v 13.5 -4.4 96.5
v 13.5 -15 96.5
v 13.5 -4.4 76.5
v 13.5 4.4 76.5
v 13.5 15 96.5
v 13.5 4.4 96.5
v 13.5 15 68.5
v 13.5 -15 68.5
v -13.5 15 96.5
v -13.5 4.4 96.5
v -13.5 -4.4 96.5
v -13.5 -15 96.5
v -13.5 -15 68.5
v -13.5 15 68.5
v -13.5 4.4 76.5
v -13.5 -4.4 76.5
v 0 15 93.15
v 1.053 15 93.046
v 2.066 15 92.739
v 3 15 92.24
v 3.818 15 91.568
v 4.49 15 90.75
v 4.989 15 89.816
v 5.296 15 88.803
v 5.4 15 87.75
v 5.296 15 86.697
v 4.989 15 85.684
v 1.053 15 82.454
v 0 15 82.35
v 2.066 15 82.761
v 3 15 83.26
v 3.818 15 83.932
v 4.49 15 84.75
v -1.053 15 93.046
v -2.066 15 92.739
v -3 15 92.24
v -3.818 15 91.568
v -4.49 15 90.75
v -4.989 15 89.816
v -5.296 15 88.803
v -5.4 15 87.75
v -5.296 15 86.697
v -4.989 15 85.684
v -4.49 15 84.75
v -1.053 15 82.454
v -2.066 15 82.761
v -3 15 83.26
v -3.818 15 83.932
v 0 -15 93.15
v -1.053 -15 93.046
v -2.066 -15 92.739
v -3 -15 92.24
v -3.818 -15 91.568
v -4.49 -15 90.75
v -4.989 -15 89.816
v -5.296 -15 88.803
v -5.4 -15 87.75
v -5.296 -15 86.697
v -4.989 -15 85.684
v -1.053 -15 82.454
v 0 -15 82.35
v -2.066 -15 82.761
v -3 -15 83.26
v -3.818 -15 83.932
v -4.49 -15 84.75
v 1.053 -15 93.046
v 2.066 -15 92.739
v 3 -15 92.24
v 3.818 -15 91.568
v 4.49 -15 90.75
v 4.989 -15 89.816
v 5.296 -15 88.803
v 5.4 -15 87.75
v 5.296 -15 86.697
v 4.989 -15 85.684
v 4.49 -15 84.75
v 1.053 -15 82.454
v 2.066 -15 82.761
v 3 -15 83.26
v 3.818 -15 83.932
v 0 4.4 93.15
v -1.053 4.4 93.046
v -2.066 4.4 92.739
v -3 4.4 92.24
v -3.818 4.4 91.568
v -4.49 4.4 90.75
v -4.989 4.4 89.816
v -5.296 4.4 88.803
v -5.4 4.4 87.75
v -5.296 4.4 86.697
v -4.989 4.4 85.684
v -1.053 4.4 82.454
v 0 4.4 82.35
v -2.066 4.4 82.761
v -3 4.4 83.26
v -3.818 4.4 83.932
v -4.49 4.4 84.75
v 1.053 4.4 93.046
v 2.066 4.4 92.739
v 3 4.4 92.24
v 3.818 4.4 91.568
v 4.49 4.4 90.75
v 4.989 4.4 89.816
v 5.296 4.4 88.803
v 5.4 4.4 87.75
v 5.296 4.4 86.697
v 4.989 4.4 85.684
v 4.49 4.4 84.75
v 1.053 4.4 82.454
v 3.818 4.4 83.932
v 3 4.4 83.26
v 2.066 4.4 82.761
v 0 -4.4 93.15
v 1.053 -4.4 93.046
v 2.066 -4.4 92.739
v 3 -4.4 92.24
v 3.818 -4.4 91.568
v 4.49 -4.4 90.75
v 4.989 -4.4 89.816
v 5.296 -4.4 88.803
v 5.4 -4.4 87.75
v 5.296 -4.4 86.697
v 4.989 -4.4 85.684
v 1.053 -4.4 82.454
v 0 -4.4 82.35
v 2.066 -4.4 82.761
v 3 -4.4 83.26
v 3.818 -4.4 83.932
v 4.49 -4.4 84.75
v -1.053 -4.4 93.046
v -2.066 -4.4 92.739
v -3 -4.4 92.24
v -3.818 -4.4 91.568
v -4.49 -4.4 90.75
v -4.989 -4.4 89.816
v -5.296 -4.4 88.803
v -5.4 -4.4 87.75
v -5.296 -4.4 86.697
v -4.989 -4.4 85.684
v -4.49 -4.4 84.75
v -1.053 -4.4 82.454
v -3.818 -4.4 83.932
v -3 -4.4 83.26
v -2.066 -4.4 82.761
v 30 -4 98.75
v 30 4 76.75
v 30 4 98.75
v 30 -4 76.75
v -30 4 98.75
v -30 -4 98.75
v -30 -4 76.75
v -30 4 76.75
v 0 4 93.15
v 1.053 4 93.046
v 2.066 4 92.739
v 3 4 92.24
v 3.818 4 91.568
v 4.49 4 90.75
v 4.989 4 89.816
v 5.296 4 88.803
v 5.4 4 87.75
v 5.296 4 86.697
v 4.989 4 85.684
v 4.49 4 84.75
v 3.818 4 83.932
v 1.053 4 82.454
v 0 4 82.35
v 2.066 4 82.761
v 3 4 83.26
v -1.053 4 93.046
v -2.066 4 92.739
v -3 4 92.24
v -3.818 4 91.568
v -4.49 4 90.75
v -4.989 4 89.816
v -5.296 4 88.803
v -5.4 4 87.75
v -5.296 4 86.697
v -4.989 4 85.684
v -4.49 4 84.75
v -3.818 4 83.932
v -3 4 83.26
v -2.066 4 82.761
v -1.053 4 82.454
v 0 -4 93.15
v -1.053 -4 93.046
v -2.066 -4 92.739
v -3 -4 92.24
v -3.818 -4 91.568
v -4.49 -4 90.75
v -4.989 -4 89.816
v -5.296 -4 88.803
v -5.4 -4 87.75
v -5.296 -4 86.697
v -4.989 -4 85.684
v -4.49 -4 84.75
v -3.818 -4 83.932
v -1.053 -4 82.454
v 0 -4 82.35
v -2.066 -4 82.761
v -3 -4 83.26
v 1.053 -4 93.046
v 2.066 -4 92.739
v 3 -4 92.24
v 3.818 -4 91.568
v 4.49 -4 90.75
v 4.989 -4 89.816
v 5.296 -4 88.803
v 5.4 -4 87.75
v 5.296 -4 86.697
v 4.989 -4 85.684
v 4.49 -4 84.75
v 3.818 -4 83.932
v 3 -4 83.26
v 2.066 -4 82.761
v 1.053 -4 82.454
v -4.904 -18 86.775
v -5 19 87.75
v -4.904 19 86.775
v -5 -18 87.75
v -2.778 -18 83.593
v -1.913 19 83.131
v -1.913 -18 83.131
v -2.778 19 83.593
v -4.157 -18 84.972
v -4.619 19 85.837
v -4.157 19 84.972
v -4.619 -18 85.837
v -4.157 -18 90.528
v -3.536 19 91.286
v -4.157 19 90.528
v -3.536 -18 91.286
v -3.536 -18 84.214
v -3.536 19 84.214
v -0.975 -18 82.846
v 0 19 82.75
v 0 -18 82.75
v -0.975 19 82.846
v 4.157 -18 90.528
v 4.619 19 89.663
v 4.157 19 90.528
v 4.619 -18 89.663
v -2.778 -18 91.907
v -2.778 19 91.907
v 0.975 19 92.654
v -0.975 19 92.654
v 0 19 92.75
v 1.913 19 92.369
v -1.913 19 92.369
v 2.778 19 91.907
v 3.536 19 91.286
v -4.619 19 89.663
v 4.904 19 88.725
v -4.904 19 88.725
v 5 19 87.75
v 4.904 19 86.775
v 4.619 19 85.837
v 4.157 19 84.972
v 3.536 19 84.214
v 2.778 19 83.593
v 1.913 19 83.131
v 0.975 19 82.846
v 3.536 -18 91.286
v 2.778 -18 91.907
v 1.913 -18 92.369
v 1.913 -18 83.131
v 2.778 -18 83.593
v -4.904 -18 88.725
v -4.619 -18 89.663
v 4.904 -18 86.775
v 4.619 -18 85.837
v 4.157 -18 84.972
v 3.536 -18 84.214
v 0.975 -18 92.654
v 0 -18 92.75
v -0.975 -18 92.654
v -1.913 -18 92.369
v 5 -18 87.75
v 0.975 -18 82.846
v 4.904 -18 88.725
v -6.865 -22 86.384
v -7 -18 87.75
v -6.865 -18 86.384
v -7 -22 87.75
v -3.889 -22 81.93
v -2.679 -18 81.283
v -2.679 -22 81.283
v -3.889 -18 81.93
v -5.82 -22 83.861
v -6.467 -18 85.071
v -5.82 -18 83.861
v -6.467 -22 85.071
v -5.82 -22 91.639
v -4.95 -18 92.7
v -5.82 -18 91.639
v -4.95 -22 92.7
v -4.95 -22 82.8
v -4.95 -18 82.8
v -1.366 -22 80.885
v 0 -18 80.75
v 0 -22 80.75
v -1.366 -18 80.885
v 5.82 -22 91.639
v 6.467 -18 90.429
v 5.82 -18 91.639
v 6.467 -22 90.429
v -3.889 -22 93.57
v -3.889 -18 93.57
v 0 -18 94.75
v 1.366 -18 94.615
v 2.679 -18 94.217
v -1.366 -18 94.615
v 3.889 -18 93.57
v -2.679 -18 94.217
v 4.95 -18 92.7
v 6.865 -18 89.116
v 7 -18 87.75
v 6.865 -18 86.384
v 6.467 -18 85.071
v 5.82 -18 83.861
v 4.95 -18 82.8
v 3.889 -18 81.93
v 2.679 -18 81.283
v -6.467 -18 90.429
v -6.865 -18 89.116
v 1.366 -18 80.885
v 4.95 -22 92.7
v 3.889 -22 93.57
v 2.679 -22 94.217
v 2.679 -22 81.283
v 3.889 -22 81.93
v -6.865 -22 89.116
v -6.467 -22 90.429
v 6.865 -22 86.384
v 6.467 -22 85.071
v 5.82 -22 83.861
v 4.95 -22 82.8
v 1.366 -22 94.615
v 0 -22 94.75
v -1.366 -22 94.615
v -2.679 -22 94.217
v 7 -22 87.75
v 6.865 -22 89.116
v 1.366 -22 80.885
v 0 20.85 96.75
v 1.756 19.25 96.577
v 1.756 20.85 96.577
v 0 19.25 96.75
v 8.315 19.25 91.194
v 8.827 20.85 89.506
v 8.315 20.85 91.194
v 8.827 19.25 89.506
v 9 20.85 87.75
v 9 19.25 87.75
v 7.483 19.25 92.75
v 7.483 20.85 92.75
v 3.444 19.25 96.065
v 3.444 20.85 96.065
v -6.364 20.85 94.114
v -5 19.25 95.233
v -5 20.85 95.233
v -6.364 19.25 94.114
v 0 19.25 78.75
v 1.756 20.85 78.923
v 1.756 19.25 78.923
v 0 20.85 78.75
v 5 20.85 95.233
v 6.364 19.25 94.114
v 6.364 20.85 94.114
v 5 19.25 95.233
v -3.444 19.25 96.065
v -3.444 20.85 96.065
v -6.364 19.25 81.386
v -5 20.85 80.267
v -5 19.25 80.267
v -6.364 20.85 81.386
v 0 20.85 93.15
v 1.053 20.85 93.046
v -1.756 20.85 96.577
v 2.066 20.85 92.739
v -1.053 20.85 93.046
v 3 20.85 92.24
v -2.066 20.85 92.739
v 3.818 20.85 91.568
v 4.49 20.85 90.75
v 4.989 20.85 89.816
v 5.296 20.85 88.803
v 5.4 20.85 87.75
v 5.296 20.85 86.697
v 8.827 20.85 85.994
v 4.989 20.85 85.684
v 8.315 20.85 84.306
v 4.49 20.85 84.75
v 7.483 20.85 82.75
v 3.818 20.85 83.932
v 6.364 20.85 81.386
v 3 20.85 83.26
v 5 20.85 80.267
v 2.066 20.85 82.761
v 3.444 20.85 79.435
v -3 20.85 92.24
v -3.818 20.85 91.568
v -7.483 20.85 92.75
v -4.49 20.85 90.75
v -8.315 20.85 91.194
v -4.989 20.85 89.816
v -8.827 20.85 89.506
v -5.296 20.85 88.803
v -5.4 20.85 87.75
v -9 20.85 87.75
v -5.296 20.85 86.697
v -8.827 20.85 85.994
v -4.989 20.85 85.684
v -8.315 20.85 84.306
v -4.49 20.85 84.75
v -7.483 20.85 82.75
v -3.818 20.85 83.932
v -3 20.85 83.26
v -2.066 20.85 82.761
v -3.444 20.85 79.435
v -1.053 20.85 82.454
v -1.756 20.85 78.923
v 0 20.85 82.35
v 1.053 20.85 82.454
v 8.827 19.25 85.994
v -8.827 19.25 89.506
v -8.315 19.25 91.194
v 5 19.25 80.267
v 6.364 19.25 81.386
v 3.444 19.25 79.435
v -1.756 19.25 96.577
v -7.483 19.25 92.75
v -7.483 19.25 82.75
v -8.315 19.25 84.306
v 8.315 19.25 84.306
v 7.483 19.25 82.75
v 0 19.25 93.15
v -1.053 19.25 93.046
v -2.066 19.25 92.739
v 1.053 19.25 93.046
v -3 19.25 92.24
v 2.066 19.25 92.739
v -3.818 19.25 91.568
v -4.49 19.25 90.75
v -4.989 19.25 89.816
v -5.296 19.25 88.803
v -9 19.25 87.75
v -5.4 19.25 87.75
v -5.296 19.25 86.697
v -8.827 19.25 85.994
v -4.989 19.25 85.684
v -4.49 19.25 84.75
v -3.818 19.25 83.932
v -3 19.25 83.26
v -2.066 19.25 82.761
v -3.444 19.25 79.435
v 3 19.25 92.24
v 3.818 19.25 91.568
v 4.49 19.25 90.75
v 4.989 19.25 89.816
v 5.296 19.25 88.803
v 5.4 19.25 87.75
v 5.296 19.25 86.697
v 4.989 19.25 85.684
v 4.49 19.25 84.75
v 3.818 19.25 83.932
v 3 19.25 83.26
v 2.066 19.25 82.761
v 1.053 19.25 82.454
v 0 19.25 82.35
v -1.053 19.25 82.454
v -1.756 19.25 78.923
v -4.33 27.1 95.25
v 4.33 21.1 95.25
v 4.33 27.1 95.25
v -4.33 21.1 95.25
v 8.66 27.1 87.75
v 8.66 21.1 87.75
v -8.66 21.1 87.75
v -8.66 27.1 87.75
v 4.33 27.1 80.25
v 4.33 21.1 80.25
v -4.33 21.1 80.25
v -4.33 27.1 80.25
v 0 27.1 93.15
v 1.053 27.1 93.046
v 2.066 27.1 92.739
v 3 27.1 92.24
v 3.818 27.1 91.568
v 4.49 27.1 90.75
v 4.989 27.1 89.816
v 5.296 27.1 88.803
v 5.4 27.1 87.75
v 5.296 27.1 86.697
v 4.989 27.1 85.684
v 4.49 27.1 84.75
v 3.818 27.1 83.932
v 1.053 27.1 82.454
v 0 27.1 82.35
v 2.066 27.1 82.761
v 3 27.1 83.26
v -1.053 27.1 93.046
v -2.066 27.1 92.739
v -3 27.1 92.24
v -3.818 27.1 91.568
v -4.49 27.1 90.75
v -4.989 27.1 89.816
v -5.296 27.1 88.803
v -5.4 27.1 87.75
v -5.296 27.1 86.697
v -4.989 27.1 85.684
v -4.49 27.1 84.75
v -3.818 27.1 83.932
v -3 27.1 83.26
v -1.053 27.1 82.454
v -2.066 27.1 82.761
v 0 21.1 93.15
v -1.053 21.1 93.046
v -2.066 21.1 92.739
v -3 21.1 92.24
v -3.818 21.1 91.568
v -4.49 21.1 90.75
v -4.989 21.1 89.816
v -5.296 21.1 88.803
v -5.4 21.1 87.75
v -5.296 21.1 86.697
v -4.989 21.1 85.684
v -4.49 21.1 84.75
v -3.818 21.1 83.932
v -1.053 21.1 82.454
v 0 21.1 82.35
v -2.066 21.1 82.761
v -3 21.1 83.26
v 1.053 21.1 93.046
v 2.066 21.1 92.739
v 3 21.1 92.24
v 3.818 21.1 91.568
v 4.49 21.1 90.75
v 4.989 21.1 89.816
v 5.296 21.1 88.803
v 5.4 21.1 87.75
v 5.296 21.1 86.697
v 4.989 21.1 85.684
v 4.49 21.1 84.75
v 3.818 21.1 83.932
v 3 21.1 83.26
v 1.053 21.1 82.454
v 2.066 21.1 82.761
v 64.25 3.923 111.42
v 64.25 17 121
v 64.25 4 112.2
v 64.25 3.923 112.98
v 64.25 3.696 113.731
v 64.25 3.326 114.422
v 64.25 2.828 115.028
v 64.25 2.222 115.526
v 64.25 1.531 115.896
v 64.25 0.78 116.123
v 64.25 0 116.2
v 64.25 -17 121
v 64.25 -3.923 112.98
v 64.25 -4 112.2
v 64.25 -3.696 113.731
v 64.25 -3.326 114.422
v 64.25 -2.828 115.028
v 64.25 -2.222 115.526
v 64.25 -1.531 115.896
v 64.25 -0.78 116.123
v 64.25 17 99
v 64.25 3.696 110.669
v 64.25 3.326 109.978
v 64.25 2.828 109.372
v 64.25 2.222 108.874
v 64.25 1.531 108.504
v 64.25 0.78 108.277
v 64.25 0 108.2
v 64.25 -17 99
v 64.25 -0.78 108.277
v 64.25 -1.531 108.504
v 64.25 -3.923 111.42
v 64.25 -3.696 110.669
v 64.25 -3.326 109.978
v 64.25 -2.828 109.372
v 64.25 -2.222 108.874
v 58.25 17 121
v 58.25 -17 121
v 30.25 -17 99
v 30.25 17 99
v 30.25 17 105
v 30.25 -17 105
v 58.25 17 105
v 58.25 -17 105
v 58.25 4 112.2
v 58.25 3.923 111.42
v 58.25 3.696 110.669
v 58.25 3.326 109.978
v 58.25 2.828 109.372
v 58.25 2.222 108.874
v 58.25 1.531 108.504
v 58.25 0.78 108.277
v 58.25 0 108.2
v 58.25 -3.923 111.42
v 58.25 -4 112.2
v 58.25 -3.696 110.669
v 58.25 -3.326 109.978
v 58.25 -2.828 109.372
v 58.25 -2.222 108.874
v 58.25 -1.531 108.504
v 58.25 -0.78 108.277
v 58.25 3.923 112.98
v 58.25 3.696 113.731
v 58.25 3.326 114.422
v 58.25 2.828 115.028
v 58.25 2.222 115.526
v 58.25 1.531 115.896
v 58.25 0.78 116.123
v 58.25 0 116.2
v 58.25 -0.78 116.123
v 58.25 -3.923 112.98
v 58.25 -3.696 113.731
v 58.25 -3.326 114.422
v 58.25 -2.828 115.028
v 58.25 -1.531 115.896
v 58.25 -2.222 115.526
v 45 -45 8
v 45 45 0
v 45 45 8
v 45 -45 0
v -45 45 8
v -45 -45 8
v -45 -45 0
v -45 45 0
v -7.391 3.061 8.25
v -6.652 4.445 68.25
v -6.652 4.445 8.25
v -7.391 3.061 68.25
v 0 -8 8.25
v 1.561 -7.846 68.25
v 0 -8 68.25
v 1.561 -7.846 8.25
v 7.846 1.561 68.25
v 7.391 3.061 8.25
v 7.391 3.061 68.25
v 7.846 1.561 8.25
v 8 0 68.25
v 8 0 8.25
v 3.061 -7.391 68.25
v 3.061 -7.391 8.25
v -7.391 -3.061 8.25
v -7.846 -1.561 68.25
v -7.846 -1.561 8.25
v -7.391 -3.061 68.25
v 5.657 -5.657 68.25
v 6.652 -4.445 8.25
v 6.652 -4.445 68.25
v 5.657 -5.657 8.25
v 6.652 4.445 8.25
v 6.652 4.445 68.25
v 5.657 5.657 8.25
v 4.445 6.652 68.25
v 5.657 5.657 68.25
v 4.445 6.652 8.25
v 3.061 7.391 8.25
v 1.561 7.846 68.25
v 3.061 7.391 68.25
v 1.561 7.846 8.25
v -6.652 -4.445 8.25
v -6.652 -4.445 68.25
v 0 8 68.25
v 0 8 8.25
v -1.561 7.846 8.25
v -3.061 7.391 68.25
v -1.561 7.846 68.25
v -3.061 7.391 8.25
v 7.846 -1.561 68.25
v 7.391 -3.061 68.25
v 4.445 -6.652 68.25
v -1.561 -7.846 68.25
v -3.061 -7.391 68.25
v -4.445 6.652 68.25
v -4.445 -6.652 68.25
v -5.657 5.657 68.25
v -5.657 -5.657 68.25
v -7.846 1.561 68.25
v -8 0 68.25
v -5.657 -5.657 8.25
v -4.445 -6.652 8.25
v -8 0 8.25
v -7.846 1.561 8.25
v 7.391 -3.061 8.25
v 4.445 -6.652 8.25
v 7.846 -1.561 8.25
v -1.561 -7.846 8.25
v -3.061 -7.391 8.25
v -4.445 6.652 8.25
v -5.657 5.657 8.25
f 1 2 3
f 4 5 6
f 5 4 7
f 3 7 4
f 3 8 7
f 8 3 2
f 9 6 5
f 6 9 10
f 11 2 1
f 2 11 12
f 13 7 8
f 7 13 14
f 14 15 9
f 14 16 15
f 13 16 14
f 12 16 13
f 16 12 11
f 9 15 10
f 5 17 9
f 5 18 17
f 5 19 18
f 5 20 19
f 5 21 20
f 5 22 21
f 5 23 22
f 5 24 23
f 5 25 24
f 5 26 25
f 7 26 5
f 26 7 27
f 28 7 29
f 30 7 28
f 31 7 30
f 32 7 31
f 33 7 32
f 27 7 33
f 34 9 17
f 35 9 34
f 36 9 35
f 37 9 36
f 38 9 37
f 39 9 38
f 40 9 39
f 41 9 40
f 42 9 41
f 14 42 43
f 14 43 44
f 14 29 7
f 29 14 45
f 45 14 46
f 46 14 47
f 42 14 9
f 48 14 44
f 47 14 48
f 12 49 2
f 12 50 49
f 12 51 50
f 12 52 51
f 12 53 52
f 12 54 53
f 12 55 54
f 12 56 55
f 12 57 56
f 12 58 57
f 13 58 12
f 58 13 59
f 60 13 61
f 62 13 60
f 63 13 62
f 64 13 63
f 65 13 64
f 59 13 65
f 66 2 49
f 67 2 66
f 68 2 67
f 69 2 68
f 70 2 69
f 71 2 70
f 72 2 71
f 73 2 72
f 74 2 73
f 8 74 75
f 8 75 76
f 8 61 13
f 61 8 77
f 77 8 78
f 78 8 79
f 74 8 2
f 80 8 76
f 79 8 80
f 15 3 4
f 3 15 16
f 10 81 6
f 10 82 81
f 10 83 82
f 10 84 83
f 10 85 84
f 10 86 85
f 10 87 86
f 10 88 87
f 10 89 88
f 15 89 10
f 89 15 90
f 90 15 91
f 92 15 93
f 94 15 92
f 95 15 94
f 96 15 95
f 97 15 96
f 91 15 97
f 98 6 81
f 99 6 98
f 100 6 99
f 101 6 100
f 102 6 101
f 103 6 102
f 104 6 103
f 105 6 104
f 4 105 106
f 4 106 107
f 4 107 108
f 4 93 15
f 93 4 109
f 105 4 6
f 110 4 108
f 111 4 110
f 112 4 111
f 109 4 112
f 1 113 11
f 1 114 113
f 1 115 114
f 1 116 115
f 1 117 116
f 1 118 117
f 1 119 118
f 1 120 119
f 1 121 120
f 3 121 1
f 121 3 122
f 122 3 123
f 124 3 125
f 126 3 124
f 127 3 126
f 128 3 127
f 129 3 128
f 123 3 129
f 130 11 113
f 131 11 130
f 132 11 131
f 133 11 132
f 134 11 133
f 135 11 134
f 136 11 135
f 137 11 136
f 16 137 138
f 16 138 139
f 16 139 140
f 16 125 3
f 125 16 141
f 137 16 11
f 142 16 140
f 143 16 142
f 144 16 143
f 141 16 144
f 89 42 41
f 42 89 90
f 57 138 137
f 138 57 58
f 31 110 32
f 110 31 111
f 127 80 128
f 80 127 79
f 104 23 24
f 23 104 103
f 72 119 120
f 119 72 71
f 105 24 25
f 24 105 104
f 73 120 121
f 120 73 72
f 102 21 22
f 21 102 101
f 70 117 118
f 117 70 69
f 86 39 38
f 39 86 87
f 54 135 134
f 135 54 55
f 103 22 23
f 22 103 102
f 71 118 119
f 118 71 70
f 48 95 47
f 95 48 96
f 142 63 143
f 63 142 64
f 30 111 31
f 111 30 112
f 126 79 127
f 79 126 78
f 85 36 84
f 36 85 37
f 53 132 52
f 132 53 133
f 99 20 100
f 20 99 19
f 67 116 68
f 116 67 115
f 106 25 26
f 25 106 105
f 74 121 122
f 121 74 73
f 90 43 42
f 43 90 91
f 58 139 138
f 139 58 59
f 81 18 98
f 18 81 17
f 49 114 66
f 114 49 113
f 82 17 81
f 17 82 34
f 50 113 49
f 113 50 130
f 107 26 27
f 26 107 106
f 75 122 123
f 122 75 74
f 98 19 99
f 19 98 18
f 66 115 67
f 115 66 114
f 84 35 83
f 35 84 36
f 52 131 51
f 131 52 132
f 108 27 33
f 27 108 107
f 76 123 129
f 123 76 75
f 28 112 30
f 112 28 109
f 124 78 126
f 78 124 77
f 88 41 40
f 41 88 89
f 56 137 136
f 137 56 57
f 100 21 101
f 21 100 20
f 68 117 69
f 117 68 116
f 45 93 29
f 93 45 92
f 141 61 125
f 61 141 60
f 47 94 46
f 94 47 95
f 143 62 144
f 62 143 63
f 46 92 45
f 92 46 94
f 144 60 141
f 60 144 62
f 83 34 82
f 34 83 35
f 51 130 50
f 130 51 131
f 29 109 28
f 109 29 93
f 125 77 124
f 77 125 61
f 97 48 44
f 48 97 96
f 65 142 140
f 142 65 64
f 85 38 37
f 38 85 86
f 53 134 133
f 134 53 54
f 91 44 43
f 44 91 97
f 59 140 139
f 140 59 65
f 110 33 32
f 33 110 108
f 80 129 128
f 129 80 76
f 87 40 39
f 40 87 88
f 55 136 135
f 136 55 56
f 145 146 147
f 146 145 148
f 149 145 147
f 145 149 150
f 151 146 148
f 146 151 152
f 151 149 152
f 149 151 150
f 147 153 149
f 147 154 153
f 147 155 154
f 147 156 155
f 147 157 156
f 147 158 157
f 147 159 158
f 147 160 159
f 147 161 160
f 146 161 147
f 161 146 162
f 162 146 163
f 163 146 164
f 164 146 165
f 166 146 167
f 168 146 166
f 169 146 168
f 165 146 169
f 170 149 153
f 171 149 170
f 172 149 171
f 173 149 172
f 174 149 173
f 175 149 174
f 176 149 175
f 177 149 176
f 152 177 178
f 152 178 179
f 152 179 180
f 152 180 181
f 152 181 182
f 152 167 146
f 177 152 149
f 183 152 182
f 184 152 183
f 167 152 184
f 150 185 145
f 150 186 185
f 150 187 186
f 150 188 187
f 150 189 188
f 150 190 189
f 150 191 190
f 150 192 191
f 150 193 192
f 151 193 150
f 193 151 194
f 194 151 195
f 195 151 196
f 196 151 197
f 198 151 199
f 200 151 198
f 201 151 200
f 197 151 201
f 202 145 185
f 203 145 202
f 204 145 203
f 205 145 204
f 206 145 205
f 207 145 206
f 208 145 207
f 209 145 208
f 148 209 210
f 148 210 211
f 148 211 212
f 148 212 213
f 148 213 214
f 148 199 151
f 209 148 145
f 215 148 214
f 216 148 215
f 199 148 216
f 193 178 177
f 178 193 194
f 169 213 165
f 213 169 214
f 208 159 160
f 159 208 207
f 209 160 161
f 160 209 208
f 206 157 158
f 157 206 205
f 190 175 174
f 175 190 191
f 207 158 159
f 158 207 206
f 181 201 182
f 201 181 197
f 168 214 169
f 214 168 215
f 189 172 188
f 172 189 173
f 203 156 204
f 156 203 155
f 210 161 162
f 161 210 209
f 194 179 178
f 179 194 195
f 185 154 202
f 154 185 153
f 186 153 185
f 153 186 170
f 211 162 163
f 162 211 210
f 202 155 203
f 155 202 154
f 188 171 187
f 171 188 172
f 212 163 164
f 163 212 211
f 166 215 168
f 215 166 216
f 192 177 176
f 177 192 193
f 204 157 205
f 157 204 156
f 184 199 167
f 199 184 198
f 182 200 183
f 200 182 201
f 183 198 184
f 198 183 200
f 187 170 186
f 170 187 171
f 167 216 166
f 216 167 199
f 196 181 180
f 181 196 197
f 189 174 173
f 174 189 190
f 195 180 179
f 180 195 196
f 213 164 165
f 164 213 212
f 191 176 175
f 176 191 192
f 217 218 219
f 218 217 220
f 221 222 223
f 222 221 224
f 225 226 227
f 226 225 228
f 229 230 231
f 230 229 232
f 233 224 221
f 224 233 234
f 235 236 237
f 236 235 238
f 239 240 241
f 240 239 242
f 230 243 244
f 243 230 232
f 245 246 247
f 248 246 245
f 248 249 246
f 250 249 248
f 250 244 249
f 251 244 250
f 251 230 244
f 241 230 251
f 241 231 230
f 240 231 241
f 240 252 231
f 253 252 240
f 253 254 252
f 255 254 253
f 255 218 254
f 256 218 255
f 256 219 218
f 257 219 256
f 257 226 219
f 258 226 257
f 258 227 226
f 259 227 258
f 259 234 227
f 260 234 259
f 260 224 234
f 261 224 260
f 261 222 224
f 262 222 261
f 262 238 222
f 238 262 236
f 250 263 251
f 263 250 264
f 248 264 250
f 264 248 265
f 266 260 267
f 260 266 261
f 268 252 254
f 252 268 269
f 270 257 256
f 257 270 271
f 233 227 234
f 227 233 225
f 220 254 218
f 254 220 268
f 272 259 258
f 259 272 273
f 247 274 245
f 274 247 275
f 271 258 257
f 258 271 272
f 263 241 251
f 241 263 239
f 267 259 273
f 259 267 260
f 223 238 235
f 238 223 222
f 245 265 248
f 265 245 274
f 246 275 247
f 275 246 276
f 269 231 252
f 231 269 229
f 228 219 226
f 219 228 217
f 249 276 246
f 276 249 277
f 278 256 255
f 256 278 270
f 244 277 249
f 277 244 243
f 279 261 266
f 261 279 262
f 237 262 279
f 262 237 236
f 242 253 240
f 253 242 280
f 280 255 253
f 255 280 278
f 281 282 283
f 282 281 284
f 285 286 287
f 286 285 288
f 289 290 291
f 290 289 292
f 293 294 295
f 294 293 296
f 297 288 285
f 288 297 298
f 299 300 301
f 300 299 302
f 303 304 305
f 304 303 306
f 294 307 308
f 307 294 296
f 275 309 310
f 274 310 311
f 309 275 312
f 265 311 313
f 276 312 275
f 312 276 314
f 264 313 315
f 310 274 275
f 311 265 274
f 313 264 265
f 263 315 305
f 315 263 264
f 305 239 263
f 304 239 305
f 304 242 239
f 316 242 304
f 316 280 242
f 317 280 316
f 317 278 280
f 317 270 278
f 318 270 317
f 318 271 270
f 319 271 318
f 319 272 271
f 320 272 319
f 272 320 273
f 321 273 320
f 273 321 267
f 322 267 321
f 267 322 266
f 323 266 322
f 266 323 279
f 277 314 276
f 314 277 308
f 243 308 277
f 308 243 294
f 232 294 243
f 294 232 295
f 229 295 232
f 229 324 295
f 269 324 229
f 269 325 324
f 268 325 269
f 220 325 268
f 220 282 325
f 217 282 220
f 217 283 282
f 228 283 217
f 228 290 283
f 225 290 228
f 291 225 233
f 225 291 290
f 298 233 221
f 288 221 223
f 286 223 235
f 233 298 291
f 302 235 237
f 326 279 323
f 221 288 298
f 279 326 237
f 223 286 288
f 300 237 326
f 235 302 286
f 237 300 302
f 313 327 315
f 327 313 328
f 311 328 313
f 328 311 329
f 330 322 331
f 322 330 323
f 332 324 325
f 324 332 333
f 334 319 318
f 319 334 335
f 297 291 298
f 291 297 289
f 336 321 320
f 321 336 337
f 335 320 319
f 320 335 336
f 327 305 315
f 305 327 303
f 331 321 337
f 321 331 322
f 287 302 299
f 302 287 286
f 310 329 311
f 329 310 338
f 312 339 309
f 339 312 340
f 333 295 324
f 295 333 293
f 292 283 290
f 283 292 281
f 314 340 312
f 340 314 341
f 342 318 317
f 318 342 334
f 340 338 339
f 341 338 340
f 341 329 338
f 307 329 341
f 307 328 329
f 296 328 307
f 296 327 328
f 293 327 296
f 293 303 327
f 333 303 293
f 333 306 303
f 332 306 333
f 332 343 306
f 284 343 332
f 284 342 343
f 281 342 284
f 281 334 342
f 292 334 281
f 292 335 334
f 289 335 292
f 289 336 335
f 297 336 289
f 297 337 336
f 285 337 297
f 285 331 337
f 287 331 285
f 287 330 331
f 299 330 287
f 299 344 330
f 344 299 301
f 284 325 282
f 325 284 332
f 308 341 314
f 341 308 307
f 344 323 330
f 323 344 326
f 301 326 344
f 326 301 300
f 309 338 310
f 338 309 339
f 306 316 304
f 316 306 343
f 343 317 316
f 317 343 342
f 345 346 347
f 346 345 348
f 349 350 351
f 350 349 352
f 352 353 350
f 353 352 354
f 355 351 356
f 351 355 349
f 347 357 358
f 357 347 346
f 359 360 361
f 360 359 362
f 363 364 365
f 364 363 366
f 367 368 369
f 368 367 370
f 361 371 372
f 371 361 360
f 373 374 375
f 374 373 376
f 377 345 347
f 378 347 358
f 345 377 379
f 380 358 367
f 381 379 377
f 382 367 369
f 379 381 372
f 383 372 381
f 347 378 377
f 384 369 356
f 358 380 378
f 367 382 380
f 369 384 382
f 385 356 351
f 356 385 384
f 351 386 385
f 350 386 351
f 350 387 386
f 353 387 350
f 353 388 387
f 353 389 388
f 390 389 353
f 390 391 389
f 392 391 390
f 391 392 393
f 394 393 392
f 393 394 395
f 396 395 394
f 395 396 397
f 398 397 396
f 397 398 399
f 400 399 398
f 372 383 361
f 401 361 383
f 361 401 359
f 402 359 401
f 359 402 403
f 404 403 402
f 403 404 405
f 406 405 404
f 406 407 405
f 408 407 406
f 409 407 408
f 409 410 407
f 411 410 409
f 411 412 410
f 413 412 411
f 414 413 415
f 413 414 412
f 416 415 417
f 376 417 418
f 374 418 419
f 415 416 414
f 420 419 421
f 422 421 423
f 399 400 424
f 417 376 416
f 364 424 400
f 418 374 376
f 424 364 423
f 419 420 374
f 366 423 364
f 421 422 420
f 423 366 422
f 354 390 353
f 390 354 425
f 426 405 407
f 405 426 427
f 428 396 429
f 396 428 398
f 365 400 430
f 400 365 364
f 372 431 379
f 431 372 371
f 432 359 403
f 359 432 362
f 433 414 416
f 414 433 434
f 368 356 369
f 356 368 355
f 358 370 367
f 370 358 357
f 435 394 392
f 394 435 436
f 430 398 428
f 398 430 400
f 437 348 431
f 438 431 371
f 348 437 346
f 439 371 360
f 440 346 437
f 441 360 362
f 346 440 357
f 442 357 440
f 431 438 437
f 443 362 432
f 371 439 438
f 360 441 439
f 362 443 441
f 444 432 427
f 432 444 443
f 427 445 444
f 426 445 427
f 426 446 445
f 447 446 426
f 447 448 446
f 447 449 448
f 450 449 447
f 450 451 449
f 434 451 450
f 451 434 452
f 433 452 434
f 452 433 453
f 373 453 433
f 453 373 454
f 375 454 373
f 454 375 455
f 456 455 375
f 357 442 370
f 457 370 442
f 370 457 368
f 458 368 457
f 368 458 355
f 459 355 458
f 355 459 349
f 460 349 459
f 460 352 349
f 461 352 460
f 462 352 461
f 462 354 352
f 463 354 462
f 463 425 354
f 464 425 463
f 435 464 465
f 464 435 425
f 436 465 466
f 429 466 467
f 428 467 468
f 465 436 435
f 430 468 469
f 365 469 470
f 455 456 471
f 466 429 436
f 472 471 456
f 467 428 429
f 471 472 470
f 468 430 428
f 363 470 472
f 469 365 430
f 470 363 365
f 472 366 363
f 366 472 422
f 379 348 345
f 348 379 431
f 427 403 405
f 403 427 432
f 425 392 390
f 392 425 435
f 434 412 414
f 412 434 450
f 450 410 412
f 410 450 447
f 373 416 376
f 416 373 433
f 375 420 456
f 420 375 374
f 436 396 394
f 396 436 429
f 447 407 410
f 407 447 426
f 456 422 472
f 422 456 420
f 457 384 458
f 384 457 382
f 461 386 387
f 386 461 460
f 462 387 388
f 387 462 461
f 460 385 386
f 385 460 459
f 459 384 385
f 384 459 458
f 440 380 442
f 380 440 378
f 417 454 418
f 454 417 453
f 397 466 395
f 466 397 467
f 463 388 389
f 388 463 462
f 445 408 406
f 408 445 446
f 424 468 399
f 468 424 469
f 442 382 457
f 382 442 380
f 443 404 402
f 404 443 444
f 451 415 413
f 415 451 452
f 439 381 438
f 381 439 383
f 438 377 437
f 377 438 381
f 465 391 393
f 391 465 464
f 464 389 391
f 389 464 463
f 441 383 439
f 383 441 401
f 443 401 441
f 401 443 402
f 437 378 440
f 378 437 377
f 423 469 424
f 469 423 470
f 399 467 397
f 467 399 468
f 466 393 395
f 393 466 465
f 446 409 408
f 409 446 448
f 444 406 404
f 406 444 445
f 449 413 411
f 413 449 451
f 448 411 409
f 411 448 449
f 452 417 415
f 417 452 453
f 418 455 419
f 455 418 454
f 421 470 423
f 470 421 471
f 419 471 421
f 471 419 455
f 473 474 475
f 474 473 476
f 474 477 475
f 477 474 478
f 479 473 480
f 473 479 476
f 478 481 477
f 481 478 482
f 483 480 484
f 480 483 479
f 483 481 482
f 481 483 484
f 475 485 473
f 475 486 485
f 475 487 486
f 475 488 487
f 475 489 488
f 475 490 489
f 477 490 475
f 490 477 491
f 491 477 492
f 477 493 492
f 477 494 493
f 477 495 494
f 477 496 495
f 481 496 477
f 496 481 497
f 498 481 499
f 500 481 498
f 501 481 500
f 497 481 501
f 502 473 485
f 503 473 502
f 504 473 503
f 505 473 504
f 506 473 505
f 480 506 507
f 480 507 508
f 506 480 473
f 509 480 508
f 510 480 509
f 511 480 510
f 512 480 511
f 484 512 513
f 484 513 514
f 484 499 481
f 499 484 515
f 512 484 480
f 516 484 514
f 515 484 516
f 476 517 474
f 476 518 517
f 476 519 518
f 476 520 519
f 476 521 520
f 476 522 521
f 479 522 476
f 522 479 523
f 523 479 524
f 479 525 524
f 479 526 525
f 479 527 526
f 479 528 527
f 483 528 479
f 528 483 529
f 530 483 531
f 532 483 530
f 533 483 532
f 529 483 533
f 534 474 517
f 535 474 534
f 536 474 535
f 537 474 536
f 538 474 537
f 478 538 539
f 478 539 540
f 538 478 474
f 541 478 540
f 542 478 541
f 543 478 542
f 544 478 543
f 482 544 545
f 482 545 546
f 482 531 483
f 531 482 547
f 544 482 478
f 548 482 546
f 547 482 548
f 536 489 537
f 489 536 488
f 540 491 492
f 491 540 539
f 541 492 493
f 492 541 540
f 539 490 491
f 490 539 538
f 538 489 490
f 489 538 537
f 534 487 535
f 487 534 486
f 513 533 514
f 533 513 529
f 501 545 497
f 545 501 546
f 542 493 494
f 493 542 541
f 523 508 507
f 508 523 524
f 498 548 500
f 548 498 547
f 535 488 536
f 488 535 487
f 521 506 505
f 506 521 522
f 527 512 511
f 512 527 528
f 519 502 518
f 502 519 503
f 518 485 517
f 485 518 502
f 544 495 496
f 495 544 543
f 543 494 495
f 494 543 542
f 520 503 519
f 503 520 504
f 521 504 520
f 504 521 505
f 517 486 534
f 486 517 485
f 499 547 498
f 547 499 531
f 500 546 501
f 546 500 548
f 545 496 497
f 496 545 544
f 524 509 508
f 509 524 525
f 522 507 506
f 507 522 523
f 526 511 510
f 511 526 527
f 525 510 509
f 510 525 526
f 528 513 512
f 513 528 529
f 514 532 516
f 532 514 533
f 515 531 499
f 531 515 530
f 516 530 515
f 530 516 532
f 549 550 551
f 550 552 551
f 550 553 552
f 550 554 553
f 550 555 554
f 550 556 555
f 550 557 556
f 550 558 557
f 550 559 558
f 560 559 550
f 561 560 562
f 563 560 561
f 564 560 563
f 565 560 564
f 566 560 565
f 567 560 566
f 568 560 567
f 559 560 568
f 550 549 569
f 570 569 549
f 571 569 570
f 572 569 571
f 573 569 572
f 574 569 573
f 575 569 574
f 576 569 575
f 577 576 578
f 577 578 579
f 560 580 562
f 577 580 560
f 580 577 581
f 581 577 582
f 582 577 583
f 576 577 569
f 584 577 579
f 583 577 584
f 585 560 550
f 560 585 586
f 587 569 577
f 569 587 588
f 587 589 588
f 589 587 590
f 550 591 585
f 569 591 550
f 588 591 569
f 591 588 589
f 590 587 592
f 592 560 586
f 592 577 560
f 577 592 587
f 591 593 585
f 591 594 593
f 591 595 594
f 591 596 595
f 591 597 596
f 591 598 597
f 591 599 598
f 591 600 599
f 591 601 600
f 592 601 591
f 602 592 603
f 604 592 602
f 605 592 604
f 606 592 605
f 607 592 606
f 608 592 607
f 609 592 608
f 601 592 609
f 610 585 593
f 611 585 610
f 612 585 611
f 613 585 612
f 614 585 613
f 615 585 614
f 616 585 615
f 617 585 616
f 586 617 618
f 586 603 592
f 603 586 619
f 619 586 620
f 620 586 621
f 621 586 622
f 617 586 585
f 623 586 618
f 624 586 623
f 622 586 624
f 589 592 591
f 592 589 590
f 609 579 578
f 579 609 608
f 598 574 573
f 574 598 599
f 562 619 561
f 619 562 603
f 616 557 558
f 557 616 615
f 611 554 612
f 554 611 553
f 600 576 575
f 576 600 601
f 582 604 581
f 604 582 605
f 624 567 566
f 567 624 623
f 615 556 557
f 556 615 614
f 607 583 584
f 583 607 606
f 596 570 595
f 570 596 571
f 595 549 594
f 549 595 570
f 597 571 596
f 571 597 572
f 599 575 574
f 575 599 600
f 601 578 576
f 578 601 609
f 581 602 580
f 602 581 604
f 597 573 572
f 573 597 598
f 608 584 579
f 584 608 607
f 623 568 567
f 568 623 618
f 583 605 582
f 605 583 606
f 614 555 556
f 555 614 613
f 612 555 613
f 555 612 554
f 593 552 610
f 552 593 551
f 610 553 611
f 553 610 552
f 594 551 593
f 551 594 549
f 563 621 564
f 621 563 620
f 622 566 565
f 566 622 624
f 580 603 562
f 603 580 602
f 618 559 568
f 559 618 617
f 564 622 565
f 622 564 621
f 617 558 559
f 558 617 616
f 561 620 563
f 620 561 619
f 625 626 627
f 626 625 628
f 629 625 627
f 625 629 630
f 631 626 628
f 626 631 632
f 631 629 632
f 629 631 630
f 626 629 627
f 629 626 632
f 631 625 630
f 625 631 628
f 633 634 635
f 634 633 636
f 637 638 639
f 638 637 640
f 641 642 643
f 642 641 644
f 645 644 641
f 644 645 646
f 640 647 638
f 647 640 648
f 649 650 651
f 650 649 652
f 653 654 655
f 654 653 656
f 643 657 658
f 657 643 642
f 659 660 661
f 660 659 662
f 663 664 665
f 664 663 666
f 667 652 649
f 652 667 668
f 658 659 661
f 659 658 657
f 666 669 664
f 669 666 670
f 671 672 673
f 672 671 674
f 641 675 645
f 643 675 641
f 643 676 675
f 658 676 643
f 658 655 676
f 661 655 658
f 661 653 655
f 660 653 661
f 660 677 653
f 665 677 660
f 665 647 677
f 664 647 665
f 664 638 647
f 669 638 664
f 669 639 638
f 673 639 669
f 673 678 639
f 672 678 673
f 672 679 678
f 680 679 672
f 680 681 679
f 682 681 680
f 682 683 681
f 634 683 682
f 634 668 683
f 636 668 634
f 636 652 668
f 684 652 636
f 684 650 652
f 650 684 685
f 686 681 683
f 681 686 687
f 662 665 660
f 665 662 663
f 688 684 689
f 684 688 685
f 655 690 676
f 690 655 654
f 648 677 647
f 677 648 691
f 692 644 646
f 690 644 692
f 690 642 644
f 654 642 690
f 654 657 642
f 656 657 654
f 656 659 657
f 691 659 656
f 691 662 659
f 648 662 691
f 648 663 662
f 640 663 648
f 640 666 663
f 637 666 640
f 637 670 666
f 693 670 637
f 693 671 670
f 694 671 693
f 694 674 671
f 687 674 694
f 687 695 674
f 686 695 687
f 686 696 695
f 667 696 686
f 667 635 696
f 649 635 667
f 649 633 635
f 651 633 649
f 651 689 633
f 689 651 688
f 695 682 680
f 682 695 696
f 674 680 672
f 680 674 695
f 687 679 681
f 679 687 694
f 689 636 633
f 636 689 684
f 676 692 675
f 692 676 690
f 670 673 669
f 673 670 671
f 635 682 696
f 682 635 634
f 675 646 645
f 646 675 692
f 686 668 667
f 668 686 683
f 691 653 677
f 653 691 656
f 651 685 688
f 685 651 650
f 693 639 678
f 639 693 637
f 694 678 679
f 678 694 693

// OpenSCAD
$fn = 32;

// ------------------------------------------------------------------------
// Lamp arm: column d16 x 60 mm, arm 60 mm
// Every part is its own module, assembly() places every instance.
// ------------------------------------------------------------------------

// --- part 1 ---
module lamp_base() {
  difference() {
    translate([-45, -45, 0]) cube([90, 90, 8]);
  }
}

// --- part 2 ---
module lamp_column() {
  cylinder(h = 60, d = 16);
}

// --- part 3 ---
module head_fork() {
  difference() {
    translate([-13.5, -15, 0]) cube([27, 30, 28]);
    translate([-14.5, -4.4, 8]) cube([29, 8.8, 21]);
    translate([0, 0, 19.25]) rotate([90, 0, 0]) cylinder(h = 32, d = 10.8, center = true);
  }
}

// --- part 4 ---
module lamp_arm() {
  difference() {
    translate([-30, -4, 0]) cube([60, 8, 22]);
    translate([0, 0, 11]) rotate([90, 0, 0]) cylinder(h = 10, d = 10.8, center = true);
  }
}

// --- part 5 ---
module arm_pin() {
  rotate([0, 90, 0]) cylinder(h = 38, d = 10, center = true);
  translate([-22, 0, 0]) rotate([0, 90, 0]) cylinder(h = 4, d = 14);
}

// --- part 6 ---
module arm_washer() {
  difference() {
      translate([0, 0, 0]) cylinder(h = 1.6, d = 18);
      translate([0, 0, -1]) cylinder(h = 3.6, d = 10.8);
    }
}

// --- part 7 ---
module arm_nut() {
  difference() {
    linear_extrude(height = 6) polygon(points = [[8.66, 0], [4.33, 7.5], [-4.33, 7.5], [-8.66, 0], [-4.33, -7.5], [4.33, -7.5]]);
    translate([0, 0, -1]) cylinder(h = 8, d = 10.8);
  }
}

// --- part 8 ---
module shade_bracket() {
  difference() {
    translate([-17, -17, 0]) cube([34, 34, 22]);
    translate([-18, -18, 6]) cube([29, 36, 17]);
    translate([14, 0, 13.2]) rotate([0, 90, 0]) cylinder(h = 8, d = 8, center = true);
  }
}

// --- assembly ---
module assembly() {
  color([0.80, 0.24, 0.20]) translate([0, 0, 0]) rotate([0, 0, 0]) lamp_base();
  color([0.20, 0.45, 0.75]) translate([0, 0, 8.25]) rotate([0, 0, 0]) lamp_column();
  color([0.25, 0.62, 0.32]) translate([0, 0, 68.5]) rotate([0, 0, 0]) head_fork();
  color([0.92, 0.70, 0.18]) translate([0, 0, 76.75]) rotate([0, 0, 0]) lamp_arm();
  color([0.58, 0.35, 0.70]) translate([0, 0, 87.75]) rotate([0, 0, 90]) arm_pin();
  color([0.16, 0.66, 0.66]) translate([0, 20.85, 87.75]) rotate([90, 0, 0]) arm_washer();
  color([0.85, 0.48, 0.18]) translate([0, 27.1, 87.75]) rotate([90, 0, 0]) arm_nut();
  color([0.55, 0.60, 0.65]) translate([47.25, 0, 99]) rotate([0, 0, 0]) shade_bracket();
}

assembly();
